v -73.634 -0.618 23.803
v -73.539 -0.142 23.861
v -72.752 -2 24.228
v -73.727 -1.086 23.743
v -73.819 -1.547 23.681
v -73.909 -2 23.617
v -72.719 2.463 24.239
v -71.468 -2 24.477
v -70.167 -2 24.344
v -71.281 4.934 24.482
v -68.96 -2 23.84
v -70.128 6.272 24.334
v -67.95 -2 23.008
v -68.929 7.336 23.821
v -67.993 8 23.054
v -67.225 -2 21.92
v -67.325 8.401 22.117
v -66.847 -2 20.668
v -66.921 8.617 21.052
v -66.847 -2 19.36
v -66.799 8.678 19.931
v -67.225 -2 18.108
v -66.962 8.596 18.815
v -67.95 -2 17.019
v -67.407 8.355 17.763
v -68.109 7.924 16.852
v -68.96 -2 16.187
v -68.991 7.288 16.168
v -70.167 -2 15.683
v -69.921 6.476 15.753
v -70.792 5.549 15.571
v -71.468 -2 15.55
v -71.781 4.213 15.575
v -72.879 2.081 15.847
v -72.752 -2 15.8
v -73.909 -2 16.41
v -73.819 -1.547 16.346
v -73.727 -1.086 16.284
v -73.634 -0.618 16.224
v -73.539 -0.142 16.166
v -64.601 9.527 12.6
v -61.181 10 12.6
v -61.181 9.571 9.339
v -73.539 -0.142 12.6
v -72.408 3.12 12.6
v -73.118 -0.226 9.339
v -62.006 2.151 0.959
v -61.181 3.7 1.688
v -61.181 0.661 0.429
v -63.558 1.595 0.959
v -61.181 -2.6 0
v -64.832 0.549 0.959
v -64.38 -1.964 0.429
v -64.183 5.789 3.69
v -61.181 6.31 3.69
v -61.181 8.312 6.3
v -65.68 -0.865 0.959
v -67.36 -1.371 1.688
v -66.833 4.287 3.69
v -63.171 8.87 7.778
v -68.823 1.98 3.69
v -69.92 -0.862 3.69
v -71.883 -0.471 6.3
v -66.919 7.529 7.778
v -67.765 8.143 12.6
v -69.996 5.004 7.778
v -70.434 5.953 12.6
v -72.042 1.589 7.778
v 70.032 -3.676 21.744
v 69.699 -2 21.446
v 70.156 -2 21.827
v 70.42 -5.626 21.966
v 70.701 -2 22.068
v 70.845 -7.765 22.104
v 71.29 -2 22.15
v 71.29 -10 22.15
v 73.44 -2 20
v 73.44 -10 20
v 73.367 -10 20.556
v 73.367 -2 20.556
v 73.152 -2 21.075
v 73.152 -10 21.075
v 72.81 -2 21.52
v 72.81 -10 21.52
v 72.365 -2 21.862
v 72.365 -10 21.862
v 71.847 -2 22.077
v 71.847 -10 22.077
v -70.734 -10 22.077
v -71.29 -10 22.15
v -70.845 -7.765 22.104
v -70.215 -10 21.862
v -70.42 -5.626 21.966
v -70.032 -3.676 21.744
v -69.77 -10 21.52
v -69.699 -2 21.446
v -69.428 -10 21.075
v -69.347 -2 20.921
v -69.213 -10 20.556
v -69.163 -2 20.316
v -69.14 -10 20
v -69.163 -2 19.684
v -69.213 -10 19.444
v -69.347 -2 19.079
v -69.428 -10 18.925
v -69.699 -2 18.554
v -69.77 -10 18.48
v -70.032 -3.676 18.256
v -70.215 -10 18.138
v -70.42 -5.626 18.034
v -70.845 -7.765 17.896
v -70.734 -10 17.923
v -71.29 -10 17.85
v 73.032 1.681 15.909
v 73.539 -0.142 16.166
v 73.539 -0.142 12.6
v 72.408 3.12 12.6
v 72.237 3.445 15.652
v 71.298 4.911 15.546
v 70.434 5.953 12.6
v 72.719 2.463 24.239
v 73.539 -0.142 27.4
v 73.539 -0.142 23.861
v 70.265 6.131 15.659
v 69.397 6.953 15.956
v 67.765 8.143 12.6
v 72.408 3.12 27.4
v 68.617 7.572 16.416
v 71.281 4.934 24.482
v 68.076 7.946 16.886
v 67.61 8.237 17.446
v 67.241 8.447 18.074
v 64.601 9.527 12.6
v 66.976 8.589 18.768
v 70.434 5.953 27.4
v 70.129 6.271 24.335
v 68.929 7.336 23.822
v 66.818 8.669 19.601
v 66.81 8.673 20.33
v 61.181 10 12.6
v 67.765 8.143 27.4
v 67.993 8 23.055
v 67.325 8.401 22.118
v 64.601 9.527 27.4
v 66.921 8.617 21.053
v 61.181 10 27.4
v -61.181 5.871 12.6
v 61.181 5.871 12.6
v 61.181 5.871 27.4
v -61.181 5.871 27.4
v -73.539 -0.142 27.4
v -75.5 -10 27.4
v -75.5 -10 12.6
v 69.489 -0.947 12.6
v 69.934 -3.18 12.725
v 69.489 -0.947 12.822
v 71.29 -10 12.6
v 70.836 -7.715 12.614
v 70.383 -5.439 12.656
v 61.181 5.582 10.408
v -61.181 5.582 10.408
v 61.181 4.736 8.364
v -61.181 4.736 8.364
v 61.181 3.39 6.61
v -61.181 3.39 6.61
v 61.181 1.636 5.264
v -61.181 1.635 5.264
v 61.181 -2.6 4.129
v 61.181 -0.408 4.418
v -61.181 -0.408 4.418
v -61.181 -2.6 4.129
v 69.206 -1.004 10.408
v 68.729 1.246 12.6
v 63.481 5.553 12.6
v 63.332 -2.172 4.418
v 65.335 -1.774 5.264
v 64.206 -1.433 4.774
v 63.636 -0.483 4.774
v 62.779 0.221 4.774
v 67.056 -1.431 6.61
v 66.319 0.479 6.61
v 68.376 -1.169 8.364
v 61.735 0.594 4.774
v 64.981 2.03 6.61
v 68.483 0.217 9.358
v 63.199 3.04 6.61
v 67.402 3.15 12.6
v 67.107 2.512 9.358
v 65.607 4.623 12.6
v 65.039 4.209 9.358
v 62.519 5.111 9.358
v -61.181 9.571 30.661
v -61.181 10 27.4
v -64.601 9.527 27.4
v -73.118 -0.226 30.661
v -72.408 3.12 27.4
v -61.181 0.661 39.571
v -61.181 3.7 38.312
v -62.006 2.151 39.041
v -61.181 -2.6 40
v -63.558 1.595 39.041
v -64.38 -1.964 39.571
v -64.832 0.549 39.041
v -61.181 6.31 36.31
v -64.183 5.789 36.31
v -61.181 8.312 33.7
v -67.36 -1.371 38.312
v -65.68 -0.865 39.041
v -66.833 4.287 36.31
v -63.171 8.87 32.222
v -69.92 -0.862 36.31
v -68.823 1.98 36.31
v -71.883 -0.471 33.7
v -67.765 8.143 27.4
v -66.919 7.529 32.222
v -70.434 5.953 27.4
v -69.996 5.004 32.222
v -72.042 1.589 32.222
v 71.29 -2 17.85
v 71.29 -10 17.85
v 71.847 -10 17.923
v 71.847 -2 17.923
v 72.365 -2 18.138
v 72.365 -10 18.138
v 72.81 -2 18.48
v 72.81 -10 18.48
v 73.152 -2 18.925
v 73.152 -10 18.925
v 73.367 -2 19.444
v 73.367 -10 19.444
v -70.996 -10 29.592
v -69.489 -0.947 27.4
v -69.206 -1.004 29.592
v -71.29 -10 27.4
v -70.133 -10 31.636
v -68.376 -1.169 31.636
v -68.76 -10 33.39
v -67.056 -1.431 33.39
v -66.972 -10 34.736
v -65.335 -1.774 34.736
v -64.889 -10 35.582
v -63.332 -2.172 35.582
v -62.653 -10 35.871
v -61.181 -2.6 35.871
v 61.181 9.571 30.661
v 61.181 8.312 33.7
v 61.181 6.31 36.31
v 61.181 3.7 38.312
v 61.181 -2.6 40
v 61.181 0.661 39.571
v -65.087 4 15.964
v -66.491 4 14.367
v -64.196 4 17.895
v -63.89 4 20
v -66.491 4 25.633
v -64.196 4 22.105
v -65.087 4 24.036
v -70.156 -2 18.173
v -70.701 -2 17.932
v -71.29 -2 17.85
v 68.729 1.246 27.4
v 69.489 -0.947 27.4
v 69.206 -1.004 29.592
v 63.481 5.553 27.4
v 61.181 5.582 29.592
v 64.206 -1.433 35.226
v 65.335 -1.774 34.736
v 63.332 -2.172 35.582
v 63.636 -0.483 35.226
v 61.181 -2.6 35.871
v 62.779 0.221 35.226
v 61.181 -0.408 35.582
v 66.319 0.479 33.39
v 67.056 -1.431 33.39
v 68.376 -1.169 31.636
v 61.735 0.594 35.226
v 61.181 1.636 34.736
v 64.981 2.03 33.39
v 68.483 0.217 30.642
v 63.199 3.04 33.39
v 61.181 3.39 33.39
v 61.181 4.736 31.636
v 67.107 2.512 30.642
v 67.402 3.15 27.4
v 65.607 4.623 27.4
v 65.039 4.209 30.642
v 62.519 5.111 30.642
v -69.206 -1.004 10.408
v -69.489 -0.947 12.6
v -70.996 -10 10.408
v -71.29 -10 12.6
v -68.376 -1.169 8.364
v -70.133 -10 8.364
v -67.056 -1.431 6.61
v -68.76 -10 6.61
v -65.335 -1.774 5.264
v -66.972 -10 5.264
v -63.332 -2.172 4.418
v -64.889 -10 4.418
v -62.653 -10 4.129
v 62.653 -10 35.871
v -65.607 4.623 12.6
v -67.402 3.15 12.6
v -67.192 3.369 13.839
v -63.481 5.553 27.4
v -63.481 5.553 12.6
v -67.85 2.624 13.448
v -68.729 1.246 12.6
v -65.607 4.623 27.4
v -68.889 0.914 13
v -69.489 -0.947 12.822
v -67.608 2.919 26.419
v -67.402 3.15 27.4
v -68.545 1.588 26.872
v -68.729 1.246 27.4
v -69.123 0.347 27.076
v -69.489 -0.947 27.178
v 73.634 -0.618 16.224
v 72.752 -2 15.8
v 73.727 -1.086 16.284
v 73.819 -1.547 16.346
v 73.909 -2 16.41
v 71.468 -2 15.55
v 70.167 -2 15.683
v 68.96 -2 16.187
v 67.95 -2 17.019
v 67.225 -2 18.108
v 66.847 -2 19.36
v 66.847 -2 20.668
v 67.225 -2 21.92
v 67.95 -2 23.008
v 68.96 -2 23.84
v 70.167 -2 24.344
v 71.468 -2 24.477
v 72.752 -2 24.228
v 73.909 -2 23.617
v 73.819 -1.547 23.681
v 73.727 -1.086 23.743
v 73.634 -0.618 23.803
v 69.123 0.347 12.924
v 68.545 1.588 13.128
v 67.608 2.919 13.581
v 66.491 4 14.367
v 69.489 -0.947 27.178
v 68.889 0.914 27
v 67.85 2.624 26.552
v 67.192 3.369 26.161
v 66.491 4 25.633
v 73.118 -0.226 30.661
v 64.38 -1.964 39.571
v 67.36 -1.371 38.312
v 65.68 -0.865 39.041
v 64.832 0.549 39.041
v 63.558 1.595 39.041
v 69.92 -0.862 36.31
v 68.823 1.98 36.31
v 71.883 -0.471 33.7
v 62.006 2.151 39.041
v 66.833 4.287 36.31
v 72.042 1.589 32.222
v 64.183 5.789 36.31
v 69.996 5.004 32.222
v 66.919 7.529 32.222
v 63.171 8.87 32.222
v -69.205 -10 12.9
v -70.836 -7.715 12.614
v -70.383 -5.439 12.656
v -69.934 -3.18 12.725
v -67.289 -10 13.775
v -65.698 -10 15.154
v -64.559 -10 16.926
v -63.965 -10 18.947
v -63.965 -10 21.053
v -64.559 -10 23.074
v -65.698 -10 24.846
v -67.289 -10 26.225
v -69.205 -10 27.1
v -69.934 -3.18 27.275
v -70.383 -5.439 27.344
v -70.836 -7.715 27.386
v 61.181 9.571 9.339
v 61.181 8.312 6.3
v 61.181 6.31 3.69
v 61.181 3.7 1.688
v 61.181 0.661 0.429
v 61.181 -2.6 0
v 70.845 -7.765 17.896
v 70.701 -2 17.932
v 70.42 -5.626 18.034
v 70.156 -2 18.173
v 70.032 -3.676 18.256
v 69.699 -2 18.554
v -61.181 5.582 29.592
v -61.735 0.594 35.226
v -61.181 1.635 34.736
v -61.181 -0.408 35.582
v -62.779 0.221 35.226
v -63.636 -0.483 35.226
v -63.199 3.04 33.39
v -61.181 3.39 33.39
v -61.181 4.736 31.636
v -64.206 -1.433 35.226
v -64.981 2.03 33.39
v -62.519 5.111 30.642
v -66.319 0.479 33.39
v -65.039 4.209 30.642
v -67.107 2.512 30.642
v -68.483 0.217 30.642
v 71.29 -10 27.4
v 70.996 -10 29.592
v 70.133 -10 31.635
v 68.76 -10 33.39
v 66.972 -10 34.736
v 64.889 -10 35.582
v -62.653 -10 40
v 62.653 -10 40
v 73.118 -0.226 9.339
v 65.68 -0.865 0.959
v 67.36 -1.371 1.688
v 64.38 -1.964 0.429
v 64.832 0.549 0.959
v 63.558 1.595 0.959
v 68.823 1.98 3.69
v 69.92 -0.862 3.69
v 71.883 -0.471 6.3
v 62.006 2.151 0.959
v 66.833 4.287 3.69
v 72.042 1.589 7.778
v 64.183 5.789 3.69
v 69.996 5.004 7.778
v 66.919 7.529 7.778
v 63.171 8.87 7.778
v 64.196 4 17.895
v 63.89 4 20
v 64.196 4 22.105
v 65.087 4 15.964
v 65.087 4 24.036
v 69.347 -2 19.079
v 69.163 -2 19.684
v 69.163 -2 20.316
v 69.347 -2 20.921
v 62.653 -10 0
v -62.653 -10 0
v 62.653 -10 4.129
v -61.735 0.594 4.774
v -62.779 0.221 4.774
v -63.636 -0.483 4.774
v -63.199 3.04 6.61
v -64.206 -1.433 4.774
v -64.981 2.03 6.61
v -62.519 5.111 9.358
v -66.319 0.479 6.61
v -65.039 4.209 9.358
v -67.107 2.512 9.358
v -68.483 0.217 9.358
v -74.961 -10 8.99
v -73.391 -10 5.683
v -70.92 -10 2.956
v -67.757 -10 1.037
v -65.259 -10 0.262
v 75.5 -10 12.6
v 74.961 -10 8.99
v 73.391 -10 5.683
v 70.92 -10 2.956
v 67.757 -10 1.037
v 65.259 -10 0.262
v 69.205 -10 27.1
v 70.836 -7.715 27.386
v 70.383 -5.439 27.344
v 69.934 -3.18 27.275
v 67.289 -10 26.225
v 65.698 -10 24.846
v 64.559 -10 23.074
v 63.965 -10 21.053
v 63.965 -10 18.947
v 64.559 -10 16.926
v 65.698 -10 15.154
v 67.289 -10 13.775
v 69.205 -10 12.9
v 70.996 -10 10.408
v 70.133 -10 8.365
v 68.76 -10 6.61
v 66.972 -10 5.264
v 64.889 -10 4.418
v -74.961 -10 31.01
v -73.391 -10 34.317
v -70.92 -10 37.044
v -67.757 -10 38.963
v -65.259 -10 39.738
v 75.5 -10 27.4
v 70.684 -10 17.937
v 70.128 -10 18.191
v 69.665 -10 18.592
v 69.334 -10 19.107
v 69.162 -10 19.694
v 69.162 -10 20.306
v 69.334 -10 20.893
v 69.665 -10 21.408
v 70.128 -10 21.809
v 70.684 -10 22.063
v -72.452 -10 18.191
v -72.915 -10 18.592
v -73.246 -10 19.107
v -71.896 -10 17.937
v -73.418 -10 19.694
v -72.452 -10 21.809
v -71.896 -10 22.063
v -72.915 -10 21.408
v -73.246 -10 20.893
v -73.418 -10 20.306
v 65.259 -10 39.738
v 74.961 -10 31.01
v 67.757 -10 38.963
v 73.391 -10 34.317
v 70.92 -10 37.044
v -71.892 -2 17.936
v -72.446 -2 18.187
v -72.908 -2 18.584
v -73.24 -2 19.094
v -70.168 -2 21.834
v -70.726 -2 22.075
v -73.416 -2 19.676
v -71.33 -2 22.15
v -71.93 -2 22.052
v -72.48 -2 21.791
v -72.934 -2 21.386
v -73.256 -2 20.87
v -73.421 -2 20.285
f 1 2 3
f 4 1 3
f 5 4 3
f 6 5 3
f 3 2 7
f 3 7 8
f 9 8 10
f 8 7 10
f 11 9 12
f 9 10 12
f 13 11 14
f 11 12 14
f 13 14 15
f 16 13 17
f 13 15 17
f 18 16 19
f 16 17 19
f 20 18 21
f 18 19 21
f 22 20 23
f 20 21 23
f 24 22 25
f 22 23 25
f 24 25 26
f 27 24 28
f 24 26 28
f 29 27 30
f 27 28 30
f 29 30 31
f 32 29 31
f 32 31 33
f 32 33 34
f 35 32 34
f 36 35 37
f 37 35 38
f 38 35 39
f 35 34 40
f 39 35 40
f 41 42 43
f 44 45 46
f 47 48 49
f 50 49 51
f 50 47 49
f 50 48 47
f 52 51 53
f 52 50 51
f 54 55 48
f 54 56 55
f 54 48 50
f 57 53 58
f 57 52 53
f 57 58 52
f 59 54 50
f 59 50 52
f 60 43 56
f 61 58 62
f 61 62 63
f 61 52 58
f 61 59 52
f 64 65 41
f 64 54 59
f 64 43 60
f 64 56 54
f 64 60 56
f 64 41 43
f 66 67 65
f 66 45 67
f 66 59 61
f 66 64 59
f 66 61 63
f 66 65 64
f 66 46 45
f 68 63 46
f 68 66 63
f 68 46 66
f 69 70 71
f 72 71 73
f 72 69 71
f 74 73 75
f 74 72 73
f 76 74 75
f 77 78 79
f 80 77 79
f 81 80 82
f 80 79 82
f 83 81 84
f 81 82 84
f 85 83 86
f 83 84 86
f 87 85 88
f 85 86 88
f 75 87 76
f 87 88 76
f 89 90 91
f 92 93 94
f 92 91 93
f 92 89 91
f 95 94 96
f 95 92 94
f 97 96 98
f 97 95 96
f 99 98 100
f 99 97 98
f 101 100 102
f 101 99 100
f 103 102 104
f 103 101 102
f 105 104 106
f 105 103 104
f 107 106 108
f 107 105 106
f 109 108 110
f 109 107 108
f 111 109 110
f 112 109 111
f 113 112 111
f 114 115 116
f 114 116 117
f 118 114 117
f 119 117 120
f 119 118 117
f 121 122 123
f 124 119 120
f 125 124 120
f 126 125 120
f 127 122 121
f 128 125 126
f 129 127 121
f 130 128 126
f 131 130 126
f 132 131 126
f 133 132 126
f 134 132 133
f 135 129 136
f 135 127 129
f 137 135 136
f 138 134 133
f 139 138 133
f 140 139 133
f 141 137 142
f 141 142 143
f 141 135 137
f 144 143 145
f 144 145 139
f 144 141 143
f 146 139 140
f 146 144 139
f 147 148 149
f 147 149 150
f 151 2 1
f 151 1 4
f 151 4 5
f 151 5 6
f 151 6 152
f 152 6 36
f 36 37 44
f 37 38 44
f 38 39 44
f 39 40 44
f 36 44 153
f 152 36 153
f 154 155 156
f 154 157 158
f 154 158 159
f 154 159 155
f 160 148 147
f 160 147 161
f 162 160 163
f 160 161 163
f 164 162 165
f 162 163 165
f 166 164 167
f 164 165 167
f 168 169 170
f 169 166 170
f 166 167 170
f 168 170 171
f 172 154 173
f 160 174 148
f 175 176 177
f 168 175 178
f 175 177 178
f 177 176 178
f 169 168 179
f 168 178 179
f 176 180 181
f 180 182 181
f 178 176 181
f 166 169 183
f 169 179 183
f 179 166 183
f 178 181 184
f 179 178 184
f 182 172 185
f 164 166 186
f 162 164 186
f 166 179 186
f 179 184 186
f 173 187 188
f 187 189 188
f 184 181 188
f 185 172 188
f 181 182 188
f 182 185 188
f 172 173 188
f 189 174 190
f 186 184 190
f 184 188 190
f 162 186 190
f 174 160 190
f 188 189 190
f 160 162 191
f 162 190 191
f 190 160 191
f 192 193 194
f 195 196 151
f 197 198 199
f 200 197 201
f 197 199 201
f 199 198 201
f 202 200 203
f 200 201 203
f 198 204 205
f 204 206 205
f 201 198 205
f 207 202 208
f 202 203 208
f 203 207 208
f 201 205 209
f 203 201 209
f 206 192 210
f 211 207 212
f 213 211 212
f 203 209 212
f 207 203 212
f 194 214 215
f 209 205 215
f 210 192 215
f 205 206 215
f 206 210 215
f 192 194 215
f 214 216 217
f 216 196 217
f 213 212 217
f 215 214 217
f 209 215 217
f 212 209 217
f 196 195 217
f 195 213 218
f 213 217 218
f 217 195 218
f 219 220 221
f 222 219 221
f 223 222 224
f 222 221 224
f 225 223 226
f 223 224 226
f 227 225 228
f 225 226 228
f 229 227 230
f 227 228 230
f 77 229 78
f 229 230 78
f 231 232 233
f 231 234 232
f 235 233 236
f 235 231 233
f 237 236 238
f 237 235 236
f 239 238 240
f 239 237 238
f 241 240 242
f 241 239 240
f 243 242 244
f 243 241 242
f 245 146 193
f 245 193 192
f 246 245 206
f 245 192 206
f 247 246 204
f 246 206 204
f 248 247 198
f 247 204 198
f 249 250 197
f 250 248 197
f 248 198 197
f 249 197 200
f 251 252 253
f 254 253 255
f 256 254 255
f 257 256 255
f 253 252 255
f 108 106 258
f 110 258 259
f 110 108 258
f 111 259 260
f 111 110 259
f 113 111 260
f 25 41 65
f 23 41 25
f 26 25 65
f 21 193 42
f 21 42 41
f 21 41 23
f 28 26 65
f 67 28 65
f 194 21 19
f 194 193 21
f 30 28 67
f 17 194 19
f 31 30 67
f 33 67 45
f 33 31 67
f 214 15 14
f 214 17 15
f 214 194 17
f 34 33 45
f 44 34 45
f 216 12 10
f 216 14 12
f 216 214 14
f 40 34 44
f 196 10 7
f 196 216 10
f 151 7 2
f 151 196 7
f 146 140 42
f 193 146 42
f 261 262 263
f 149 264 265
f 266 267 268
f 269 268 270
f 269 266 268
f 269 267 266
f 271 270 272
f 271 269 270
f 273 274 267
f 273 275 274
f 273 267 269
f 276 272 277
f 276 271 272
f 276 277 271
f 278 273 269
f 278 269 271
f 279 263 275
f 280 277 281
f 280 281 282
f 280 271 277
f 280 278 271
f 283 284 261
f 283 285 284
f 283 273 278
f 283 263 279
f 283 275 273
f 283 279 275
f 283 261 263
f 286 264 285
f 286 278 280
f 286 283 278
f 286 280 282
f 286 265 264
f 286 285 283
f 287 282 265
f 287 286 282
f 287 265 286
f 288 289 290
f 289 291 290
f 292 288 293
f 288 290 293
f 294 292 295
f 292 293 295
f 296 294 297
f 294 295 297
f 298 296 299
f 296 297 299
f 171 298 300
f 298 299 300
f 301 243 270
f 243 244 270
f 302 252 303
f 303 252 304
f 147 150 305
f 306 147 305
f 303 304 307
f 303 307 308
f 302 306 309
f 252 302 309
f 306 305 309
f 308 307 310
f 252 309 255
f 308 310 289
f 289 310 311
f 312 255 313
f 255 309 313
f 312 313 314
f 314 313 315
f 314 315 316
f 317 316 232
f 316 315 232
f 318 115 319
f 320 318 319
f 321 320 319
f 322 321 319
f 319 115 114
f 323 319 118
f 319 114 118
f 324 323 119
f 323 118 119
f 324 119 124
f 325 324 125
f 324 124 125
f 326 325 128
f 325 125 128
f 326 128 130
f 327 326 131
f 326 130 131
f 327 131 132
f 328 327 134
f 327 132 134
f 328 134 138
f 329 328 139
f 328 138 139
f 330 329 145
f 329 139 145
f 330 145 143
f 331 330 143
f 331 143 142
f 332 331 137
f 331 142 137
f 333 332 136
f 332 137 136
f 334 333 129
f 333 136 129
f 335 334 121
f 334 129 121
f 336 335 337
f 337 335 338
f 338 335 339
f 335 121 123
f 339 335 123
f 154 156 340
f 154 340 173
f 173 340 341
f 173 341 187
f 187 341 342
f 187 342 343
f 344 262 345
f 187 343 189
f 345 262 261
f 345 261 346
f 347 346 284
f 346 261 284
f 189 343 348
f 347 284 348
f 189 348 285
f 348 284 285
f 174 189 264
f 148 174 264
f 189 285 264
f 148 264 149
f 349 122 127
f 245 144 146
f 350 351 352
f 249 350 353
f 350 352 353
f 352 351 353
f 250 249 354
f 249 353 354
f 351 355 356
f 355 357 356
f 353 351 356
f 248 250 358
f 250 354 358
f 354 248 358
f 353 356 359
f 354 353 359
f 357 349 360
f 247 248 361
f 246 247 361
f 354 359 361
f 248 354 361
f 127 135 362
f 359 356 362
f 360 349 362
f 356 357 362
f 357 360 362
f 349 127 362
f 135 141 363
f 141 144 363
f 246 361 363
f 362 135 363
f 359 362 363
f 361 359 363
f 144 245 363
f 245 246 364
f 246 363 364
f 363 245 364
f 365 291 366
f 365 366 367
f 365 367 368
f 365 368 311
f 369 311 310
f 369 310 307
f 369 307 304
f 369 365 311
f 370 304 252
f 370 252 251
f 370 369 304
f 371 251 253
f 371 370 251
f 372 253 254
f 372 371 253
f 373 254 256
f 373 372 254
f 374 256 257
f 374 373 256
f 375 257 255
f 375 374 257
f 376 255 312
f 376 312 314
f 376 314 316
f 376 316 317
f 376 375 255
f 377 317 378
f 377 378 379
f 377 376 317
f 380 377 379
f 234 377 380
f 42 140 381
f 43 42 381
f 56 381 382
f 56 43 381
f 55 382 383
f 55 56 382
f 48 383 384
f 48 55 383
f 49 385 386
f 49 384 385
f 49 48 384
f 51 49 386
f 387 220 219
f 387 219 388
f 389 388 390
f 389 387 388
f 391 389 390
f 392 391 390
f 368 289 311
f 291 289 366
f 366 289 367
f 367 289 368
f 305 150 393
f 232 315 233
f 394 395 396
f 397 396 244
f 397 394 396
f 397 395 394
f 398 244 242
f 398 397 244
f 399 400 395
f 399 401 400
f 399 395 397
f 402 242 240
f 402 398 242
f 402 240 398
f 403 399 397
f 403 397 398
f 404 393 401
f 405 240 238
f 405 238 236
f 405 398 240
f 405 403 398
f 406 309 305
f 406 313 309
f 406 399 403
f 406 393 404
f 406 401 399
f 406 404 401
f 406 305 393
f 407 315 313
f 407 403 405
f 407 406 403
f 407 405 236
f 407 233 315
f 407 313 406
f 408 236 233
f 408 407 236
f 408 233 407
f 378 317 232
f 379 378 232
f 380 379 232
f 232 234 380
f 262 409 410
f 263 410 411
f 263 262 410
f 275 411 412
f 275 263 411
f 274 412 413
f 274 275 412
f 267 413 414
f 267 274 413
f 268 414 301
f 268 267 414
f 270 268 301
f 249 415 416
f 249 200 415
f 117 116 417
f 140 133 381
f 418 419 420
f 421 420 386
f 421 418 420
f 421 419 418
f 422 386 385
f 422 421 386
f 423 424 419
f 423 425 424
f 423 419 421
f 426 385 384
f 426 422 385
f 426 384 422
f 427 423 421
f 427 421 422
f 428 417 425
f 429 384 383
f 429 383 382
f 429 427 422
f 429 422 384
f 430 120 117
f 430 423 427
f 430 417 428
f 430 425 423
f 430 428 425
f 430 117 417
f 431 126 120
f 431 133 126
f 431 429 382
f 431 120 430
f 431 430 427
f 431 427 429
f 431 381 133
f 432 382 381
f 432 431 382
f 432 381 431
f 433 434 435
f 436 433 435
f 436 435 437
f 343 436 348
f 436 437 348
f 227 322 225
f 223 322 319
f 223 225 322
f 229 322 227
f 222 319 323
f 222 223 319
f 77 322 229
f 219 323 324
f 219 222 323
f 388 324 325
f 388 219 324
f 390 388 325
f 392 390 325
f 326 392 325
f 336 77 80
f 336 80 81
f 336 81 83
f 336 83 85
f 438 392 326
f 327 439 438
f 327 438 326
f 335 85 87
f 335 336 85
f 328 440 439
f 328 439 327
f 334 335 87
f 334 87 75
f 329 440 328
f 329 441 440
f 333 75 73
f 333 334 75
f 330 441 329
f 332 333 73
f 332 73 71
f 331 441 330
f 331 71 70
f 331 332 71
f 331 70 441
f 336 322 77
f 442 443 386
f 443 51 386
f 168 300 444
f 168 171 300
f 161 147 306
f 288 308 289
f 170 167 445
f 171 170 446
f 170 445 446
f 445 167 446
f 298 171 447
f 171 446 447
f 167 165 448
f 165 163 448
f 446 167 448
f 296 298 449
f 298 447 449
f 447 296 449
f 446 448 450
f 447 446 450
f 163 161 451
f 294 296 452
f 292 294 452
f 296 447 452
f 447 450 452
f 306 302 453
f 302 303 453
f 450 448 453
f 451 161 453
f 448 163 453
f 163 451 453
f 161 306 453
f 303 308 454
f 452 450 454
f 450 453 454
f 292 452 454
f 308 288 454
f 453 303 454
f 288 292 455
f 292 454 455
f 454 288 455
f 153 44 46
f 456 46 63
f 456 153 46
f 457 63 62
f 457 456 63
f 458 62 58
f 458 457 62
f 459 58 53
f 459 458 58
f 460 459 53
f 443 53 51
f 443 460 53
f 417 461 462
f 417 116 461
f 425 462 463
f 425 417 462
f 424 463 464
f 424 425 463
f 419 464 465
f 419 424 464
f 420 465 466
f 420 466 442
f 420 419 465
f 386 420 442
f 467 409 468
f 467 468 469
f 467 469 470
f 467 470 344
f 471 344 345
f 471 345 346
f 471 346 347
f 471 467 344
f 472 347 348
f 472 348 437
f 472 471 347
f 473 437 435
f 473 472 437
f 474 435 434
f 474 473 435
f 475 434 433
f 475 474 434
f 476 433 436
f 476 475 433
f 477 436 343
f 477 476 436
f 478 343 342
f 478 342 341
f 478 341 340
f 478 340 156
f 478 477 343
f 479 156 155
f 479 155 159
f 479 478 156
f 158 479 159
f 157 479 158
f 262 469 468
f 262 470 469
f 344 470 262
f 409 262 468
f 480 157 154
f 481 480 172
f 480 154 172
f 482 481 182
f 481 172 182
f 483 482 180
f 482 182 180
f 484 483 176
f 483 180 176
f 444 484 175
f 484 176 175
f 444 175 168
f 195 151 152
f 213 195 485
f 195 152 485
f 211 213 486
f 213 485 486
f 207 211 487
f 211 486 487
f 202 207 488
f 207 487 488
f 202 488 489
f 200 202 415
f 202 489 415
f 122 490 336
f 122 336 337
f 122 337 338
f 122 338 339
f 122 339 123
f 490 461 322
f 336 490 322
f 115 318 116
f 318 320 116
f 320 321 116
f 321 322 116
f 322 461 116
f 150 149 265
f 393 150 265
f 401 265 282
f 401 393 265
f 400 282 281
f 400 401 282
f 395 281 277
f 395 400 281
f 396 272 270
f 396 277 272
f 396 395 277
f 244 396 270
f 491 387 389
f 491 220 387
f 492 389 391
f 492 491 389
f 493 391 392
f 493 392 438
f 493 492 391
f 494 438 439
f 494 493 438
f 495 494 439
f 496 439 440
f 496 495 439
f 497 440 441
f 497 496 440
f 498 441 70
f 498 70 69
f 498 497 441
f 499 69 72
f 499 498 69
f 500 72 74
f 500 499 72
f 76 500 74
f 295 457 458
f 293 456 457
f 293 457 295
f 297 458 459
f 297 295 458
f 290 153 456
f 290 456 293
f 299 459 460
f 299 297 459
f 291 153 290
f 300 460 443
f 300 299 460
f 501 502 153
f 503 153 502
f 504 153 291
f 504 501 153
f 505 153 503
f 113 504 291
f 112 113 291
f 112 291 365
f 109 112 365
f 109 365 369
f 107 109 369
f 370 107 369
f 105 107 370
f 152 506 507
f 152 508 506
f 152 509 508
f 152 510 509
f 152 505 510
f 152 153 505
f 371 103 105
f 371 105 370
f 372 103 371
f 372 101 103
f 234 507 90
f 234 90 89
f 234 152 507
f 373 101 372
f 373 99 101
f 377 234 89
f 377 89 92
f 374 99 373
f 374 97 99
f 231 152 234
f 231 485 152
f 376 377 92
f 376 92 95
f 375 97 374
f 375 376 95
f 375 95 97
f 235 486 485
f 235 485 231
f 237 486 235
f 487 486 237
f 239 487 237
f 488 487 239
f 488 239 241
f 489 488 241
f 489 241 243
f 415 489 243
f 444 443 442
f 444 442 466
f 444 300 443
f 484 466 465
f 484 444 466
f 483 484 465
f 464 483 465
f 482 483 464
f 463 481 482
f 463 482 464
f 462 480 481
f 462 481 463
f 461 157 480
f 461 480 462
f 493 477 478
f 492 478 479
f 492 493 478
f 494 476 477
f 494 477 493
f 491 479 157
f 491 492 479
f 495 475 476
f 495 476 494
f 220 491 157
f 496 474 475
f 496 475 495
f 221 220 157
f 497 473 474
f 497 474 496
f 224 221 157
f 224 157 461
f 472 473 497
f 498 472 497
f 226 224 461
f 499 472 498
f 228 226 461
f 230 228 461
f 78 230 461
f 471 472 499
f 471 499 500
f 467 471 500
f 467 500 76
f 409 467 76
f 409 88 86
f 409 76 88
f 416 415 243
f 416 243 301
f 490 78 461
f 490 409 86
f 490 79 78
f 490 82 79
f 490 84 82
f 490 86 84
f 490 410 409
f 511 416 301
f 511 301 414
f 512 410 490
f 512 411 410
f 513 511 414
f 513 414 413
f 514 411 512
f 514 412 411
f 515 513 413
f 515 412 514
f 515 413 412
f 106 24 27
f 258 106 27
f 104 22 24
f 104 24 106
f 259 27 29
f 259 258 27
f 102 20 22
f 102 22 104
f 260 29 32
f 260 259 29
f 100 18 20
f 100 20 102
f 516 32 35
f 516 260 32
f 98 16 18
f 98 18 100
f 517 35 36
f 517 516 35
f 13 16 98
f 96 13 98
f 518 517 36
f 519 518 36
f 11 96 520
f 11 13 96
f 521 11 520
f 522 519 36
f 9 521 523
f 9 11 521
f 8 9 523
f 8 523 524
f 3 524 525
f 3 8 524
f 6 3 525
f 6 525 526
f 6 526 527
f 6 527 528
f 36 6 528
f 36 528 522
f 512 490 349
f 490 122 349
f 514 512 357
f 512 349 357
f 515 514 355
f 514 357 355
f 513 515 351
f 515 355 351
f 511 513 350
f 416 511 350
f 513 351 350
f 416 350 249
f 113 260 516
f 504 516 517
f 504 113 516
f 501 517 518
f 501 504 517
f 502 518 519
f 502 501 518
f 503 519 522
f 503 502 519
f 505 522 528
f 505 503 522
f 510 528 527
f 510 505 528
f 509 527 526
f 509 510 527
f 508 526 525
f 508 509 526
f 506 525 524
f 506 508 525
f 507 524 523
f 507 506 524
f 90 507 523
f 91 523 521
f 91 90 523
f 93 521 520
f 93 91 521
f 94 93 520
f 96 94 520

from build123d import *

# Parameters (mm, degrees)
F1_DEPTH = 40
F2_R     = 12.6
F3_T     = -4.129
F5_DEPTH = 14
F6_DEPTH = 20.001
F7_R     = 4.4681980282
F8_DEPTH = 12


with BuildPart() as f1:
    # F0 (on Top) → F1 (new body)
    with BuildSketch(Plane.XY):
        Polygon((-75.5, -10), (75.5, -10), (71.5217526524, 10), (-71.5217526524, 10), align=None)
    extrude(amount=F1_DEPTH)

    # F2
    f2_edges = [f1.edges().sort_by_distance(p)[0] for p in [
        (-71.521753, 10, 20),
        (0, 10, 40),
        (0, 10, 0),
        (71.521753, 10, 20),
        (-73.510876, 0, 40),
        (-73.510876, 0, 0),
        (73.510876, 0, 40),
        (73.510876, 0, 0),
    ]]
    fillet(f2_edges, radius=F2_R)

    # F3
    f3_openings = [f1.faces().sort_by_distance(p)[0] for p in [
        (0, -10, 20),
    ]]
    offset(amount=F3_T, openings=f3_openings)

    # F4 (on face) → F5 (join)
    with BuildSketch(Plane.XZ.offset(10)):
        with BuildLine():
            ThreePointArc((-71.2901081078, 22.15), (-69.7698285282, 21.5202795796), (-69.1401081078, 20))
            ThreePointArc((-69.1401081078, 20), (-69.7698285282, 18.4797204204), (-71.2901081078, 17.85))
            Line((-71.2901081078, 17.85), (-71.2901081078, 12.6))
            ThreePointArc((-71.2901081078, 12.6), (-63.8901081078, 20), (-71.2901081078, 27.4))
            Line((-71.2901081078, 27.4), (-71.2901081078, 22.15))
        make_face()
        with BuildLine():
            Line((71.2901081078, 22.15), (71.2901081078, 27.4))
            ThreePointArc((71.2901081078, 27.4), (63.8901081078, 20), (71.2901081078, 12.6))
            Line((71.2901081078, 12.6), (71.2901081078, 17.85))
            ThreePointArc((71.2901081078, 17.85), (69.1401081078, 20), (71.2901081078, 22.15))
        make_face()
    extrude(amount=-F5_DEPTH)

    # F4 (on face) → F6 (cut, through all)
    with BuildSketch(Plane.XZ.offset(10)):
        with BuildLine():
            ThreePointArc((-71.2901081078, 17.85), (-69.7698285282, 18.4797204204), (-69.1401081078, 20))
            ThreePointArc((-69.1401081078, 20), (-69.7698285282, 21.5202795796), (-71.2901081078, 22.15))
            Line((-71.2901081078, 22.15), (-71.2901081078, 17.85))
        make_face()
        with BuildLine():
            Line((-71.2901081078, 17.85), (-71.2901081078, 22.15))
            ThreePointArc((-71.2901081078, 22.15), (-73.4401081078, 20), (-71.2901081078, 17.85))
        make_face()
        with BuildLine():
            ThreePointArc((73.4401081078, 20), (72.8103876873, 21.5202795796), (71.2901081078, 22.15))
            Line((71.2901081078, 22.15), (71.2901081078, 17.85))
            ThreePointArc((71.2901081078, 17.85), (72.8103876873, 18.4797204204), (73.4401081078, 20))
        make_face()
        with BuildLine():
            Line((71.2901081078, 17.85), (71.2901081078, 22.15))
            ThreePointArc((71.2901081078, 22.15), (69.1401081078, 20), (71.2901081078, 17.85))
        make_face()
    extrude(amount=-F6_DEPTH, mode=Mode.SUBTRACT)

    # F7 (on face) → F8 (cut)
    with BuildSketch(Plane(origin=(0, 10, 0), x_dir=(-1, 0, 0), z_dir=(0, 1, 0))):
        with Locations((71.2666511536, 20.0136322528)):
            Circle(F7_R)
        with Locations((-71.2666511536, 20.0136322528)):
            Circle(F7_R)
    extrude(amount=-F8_DEPTH, mode=Mode.SUBTRACT)


solid = f1.part
